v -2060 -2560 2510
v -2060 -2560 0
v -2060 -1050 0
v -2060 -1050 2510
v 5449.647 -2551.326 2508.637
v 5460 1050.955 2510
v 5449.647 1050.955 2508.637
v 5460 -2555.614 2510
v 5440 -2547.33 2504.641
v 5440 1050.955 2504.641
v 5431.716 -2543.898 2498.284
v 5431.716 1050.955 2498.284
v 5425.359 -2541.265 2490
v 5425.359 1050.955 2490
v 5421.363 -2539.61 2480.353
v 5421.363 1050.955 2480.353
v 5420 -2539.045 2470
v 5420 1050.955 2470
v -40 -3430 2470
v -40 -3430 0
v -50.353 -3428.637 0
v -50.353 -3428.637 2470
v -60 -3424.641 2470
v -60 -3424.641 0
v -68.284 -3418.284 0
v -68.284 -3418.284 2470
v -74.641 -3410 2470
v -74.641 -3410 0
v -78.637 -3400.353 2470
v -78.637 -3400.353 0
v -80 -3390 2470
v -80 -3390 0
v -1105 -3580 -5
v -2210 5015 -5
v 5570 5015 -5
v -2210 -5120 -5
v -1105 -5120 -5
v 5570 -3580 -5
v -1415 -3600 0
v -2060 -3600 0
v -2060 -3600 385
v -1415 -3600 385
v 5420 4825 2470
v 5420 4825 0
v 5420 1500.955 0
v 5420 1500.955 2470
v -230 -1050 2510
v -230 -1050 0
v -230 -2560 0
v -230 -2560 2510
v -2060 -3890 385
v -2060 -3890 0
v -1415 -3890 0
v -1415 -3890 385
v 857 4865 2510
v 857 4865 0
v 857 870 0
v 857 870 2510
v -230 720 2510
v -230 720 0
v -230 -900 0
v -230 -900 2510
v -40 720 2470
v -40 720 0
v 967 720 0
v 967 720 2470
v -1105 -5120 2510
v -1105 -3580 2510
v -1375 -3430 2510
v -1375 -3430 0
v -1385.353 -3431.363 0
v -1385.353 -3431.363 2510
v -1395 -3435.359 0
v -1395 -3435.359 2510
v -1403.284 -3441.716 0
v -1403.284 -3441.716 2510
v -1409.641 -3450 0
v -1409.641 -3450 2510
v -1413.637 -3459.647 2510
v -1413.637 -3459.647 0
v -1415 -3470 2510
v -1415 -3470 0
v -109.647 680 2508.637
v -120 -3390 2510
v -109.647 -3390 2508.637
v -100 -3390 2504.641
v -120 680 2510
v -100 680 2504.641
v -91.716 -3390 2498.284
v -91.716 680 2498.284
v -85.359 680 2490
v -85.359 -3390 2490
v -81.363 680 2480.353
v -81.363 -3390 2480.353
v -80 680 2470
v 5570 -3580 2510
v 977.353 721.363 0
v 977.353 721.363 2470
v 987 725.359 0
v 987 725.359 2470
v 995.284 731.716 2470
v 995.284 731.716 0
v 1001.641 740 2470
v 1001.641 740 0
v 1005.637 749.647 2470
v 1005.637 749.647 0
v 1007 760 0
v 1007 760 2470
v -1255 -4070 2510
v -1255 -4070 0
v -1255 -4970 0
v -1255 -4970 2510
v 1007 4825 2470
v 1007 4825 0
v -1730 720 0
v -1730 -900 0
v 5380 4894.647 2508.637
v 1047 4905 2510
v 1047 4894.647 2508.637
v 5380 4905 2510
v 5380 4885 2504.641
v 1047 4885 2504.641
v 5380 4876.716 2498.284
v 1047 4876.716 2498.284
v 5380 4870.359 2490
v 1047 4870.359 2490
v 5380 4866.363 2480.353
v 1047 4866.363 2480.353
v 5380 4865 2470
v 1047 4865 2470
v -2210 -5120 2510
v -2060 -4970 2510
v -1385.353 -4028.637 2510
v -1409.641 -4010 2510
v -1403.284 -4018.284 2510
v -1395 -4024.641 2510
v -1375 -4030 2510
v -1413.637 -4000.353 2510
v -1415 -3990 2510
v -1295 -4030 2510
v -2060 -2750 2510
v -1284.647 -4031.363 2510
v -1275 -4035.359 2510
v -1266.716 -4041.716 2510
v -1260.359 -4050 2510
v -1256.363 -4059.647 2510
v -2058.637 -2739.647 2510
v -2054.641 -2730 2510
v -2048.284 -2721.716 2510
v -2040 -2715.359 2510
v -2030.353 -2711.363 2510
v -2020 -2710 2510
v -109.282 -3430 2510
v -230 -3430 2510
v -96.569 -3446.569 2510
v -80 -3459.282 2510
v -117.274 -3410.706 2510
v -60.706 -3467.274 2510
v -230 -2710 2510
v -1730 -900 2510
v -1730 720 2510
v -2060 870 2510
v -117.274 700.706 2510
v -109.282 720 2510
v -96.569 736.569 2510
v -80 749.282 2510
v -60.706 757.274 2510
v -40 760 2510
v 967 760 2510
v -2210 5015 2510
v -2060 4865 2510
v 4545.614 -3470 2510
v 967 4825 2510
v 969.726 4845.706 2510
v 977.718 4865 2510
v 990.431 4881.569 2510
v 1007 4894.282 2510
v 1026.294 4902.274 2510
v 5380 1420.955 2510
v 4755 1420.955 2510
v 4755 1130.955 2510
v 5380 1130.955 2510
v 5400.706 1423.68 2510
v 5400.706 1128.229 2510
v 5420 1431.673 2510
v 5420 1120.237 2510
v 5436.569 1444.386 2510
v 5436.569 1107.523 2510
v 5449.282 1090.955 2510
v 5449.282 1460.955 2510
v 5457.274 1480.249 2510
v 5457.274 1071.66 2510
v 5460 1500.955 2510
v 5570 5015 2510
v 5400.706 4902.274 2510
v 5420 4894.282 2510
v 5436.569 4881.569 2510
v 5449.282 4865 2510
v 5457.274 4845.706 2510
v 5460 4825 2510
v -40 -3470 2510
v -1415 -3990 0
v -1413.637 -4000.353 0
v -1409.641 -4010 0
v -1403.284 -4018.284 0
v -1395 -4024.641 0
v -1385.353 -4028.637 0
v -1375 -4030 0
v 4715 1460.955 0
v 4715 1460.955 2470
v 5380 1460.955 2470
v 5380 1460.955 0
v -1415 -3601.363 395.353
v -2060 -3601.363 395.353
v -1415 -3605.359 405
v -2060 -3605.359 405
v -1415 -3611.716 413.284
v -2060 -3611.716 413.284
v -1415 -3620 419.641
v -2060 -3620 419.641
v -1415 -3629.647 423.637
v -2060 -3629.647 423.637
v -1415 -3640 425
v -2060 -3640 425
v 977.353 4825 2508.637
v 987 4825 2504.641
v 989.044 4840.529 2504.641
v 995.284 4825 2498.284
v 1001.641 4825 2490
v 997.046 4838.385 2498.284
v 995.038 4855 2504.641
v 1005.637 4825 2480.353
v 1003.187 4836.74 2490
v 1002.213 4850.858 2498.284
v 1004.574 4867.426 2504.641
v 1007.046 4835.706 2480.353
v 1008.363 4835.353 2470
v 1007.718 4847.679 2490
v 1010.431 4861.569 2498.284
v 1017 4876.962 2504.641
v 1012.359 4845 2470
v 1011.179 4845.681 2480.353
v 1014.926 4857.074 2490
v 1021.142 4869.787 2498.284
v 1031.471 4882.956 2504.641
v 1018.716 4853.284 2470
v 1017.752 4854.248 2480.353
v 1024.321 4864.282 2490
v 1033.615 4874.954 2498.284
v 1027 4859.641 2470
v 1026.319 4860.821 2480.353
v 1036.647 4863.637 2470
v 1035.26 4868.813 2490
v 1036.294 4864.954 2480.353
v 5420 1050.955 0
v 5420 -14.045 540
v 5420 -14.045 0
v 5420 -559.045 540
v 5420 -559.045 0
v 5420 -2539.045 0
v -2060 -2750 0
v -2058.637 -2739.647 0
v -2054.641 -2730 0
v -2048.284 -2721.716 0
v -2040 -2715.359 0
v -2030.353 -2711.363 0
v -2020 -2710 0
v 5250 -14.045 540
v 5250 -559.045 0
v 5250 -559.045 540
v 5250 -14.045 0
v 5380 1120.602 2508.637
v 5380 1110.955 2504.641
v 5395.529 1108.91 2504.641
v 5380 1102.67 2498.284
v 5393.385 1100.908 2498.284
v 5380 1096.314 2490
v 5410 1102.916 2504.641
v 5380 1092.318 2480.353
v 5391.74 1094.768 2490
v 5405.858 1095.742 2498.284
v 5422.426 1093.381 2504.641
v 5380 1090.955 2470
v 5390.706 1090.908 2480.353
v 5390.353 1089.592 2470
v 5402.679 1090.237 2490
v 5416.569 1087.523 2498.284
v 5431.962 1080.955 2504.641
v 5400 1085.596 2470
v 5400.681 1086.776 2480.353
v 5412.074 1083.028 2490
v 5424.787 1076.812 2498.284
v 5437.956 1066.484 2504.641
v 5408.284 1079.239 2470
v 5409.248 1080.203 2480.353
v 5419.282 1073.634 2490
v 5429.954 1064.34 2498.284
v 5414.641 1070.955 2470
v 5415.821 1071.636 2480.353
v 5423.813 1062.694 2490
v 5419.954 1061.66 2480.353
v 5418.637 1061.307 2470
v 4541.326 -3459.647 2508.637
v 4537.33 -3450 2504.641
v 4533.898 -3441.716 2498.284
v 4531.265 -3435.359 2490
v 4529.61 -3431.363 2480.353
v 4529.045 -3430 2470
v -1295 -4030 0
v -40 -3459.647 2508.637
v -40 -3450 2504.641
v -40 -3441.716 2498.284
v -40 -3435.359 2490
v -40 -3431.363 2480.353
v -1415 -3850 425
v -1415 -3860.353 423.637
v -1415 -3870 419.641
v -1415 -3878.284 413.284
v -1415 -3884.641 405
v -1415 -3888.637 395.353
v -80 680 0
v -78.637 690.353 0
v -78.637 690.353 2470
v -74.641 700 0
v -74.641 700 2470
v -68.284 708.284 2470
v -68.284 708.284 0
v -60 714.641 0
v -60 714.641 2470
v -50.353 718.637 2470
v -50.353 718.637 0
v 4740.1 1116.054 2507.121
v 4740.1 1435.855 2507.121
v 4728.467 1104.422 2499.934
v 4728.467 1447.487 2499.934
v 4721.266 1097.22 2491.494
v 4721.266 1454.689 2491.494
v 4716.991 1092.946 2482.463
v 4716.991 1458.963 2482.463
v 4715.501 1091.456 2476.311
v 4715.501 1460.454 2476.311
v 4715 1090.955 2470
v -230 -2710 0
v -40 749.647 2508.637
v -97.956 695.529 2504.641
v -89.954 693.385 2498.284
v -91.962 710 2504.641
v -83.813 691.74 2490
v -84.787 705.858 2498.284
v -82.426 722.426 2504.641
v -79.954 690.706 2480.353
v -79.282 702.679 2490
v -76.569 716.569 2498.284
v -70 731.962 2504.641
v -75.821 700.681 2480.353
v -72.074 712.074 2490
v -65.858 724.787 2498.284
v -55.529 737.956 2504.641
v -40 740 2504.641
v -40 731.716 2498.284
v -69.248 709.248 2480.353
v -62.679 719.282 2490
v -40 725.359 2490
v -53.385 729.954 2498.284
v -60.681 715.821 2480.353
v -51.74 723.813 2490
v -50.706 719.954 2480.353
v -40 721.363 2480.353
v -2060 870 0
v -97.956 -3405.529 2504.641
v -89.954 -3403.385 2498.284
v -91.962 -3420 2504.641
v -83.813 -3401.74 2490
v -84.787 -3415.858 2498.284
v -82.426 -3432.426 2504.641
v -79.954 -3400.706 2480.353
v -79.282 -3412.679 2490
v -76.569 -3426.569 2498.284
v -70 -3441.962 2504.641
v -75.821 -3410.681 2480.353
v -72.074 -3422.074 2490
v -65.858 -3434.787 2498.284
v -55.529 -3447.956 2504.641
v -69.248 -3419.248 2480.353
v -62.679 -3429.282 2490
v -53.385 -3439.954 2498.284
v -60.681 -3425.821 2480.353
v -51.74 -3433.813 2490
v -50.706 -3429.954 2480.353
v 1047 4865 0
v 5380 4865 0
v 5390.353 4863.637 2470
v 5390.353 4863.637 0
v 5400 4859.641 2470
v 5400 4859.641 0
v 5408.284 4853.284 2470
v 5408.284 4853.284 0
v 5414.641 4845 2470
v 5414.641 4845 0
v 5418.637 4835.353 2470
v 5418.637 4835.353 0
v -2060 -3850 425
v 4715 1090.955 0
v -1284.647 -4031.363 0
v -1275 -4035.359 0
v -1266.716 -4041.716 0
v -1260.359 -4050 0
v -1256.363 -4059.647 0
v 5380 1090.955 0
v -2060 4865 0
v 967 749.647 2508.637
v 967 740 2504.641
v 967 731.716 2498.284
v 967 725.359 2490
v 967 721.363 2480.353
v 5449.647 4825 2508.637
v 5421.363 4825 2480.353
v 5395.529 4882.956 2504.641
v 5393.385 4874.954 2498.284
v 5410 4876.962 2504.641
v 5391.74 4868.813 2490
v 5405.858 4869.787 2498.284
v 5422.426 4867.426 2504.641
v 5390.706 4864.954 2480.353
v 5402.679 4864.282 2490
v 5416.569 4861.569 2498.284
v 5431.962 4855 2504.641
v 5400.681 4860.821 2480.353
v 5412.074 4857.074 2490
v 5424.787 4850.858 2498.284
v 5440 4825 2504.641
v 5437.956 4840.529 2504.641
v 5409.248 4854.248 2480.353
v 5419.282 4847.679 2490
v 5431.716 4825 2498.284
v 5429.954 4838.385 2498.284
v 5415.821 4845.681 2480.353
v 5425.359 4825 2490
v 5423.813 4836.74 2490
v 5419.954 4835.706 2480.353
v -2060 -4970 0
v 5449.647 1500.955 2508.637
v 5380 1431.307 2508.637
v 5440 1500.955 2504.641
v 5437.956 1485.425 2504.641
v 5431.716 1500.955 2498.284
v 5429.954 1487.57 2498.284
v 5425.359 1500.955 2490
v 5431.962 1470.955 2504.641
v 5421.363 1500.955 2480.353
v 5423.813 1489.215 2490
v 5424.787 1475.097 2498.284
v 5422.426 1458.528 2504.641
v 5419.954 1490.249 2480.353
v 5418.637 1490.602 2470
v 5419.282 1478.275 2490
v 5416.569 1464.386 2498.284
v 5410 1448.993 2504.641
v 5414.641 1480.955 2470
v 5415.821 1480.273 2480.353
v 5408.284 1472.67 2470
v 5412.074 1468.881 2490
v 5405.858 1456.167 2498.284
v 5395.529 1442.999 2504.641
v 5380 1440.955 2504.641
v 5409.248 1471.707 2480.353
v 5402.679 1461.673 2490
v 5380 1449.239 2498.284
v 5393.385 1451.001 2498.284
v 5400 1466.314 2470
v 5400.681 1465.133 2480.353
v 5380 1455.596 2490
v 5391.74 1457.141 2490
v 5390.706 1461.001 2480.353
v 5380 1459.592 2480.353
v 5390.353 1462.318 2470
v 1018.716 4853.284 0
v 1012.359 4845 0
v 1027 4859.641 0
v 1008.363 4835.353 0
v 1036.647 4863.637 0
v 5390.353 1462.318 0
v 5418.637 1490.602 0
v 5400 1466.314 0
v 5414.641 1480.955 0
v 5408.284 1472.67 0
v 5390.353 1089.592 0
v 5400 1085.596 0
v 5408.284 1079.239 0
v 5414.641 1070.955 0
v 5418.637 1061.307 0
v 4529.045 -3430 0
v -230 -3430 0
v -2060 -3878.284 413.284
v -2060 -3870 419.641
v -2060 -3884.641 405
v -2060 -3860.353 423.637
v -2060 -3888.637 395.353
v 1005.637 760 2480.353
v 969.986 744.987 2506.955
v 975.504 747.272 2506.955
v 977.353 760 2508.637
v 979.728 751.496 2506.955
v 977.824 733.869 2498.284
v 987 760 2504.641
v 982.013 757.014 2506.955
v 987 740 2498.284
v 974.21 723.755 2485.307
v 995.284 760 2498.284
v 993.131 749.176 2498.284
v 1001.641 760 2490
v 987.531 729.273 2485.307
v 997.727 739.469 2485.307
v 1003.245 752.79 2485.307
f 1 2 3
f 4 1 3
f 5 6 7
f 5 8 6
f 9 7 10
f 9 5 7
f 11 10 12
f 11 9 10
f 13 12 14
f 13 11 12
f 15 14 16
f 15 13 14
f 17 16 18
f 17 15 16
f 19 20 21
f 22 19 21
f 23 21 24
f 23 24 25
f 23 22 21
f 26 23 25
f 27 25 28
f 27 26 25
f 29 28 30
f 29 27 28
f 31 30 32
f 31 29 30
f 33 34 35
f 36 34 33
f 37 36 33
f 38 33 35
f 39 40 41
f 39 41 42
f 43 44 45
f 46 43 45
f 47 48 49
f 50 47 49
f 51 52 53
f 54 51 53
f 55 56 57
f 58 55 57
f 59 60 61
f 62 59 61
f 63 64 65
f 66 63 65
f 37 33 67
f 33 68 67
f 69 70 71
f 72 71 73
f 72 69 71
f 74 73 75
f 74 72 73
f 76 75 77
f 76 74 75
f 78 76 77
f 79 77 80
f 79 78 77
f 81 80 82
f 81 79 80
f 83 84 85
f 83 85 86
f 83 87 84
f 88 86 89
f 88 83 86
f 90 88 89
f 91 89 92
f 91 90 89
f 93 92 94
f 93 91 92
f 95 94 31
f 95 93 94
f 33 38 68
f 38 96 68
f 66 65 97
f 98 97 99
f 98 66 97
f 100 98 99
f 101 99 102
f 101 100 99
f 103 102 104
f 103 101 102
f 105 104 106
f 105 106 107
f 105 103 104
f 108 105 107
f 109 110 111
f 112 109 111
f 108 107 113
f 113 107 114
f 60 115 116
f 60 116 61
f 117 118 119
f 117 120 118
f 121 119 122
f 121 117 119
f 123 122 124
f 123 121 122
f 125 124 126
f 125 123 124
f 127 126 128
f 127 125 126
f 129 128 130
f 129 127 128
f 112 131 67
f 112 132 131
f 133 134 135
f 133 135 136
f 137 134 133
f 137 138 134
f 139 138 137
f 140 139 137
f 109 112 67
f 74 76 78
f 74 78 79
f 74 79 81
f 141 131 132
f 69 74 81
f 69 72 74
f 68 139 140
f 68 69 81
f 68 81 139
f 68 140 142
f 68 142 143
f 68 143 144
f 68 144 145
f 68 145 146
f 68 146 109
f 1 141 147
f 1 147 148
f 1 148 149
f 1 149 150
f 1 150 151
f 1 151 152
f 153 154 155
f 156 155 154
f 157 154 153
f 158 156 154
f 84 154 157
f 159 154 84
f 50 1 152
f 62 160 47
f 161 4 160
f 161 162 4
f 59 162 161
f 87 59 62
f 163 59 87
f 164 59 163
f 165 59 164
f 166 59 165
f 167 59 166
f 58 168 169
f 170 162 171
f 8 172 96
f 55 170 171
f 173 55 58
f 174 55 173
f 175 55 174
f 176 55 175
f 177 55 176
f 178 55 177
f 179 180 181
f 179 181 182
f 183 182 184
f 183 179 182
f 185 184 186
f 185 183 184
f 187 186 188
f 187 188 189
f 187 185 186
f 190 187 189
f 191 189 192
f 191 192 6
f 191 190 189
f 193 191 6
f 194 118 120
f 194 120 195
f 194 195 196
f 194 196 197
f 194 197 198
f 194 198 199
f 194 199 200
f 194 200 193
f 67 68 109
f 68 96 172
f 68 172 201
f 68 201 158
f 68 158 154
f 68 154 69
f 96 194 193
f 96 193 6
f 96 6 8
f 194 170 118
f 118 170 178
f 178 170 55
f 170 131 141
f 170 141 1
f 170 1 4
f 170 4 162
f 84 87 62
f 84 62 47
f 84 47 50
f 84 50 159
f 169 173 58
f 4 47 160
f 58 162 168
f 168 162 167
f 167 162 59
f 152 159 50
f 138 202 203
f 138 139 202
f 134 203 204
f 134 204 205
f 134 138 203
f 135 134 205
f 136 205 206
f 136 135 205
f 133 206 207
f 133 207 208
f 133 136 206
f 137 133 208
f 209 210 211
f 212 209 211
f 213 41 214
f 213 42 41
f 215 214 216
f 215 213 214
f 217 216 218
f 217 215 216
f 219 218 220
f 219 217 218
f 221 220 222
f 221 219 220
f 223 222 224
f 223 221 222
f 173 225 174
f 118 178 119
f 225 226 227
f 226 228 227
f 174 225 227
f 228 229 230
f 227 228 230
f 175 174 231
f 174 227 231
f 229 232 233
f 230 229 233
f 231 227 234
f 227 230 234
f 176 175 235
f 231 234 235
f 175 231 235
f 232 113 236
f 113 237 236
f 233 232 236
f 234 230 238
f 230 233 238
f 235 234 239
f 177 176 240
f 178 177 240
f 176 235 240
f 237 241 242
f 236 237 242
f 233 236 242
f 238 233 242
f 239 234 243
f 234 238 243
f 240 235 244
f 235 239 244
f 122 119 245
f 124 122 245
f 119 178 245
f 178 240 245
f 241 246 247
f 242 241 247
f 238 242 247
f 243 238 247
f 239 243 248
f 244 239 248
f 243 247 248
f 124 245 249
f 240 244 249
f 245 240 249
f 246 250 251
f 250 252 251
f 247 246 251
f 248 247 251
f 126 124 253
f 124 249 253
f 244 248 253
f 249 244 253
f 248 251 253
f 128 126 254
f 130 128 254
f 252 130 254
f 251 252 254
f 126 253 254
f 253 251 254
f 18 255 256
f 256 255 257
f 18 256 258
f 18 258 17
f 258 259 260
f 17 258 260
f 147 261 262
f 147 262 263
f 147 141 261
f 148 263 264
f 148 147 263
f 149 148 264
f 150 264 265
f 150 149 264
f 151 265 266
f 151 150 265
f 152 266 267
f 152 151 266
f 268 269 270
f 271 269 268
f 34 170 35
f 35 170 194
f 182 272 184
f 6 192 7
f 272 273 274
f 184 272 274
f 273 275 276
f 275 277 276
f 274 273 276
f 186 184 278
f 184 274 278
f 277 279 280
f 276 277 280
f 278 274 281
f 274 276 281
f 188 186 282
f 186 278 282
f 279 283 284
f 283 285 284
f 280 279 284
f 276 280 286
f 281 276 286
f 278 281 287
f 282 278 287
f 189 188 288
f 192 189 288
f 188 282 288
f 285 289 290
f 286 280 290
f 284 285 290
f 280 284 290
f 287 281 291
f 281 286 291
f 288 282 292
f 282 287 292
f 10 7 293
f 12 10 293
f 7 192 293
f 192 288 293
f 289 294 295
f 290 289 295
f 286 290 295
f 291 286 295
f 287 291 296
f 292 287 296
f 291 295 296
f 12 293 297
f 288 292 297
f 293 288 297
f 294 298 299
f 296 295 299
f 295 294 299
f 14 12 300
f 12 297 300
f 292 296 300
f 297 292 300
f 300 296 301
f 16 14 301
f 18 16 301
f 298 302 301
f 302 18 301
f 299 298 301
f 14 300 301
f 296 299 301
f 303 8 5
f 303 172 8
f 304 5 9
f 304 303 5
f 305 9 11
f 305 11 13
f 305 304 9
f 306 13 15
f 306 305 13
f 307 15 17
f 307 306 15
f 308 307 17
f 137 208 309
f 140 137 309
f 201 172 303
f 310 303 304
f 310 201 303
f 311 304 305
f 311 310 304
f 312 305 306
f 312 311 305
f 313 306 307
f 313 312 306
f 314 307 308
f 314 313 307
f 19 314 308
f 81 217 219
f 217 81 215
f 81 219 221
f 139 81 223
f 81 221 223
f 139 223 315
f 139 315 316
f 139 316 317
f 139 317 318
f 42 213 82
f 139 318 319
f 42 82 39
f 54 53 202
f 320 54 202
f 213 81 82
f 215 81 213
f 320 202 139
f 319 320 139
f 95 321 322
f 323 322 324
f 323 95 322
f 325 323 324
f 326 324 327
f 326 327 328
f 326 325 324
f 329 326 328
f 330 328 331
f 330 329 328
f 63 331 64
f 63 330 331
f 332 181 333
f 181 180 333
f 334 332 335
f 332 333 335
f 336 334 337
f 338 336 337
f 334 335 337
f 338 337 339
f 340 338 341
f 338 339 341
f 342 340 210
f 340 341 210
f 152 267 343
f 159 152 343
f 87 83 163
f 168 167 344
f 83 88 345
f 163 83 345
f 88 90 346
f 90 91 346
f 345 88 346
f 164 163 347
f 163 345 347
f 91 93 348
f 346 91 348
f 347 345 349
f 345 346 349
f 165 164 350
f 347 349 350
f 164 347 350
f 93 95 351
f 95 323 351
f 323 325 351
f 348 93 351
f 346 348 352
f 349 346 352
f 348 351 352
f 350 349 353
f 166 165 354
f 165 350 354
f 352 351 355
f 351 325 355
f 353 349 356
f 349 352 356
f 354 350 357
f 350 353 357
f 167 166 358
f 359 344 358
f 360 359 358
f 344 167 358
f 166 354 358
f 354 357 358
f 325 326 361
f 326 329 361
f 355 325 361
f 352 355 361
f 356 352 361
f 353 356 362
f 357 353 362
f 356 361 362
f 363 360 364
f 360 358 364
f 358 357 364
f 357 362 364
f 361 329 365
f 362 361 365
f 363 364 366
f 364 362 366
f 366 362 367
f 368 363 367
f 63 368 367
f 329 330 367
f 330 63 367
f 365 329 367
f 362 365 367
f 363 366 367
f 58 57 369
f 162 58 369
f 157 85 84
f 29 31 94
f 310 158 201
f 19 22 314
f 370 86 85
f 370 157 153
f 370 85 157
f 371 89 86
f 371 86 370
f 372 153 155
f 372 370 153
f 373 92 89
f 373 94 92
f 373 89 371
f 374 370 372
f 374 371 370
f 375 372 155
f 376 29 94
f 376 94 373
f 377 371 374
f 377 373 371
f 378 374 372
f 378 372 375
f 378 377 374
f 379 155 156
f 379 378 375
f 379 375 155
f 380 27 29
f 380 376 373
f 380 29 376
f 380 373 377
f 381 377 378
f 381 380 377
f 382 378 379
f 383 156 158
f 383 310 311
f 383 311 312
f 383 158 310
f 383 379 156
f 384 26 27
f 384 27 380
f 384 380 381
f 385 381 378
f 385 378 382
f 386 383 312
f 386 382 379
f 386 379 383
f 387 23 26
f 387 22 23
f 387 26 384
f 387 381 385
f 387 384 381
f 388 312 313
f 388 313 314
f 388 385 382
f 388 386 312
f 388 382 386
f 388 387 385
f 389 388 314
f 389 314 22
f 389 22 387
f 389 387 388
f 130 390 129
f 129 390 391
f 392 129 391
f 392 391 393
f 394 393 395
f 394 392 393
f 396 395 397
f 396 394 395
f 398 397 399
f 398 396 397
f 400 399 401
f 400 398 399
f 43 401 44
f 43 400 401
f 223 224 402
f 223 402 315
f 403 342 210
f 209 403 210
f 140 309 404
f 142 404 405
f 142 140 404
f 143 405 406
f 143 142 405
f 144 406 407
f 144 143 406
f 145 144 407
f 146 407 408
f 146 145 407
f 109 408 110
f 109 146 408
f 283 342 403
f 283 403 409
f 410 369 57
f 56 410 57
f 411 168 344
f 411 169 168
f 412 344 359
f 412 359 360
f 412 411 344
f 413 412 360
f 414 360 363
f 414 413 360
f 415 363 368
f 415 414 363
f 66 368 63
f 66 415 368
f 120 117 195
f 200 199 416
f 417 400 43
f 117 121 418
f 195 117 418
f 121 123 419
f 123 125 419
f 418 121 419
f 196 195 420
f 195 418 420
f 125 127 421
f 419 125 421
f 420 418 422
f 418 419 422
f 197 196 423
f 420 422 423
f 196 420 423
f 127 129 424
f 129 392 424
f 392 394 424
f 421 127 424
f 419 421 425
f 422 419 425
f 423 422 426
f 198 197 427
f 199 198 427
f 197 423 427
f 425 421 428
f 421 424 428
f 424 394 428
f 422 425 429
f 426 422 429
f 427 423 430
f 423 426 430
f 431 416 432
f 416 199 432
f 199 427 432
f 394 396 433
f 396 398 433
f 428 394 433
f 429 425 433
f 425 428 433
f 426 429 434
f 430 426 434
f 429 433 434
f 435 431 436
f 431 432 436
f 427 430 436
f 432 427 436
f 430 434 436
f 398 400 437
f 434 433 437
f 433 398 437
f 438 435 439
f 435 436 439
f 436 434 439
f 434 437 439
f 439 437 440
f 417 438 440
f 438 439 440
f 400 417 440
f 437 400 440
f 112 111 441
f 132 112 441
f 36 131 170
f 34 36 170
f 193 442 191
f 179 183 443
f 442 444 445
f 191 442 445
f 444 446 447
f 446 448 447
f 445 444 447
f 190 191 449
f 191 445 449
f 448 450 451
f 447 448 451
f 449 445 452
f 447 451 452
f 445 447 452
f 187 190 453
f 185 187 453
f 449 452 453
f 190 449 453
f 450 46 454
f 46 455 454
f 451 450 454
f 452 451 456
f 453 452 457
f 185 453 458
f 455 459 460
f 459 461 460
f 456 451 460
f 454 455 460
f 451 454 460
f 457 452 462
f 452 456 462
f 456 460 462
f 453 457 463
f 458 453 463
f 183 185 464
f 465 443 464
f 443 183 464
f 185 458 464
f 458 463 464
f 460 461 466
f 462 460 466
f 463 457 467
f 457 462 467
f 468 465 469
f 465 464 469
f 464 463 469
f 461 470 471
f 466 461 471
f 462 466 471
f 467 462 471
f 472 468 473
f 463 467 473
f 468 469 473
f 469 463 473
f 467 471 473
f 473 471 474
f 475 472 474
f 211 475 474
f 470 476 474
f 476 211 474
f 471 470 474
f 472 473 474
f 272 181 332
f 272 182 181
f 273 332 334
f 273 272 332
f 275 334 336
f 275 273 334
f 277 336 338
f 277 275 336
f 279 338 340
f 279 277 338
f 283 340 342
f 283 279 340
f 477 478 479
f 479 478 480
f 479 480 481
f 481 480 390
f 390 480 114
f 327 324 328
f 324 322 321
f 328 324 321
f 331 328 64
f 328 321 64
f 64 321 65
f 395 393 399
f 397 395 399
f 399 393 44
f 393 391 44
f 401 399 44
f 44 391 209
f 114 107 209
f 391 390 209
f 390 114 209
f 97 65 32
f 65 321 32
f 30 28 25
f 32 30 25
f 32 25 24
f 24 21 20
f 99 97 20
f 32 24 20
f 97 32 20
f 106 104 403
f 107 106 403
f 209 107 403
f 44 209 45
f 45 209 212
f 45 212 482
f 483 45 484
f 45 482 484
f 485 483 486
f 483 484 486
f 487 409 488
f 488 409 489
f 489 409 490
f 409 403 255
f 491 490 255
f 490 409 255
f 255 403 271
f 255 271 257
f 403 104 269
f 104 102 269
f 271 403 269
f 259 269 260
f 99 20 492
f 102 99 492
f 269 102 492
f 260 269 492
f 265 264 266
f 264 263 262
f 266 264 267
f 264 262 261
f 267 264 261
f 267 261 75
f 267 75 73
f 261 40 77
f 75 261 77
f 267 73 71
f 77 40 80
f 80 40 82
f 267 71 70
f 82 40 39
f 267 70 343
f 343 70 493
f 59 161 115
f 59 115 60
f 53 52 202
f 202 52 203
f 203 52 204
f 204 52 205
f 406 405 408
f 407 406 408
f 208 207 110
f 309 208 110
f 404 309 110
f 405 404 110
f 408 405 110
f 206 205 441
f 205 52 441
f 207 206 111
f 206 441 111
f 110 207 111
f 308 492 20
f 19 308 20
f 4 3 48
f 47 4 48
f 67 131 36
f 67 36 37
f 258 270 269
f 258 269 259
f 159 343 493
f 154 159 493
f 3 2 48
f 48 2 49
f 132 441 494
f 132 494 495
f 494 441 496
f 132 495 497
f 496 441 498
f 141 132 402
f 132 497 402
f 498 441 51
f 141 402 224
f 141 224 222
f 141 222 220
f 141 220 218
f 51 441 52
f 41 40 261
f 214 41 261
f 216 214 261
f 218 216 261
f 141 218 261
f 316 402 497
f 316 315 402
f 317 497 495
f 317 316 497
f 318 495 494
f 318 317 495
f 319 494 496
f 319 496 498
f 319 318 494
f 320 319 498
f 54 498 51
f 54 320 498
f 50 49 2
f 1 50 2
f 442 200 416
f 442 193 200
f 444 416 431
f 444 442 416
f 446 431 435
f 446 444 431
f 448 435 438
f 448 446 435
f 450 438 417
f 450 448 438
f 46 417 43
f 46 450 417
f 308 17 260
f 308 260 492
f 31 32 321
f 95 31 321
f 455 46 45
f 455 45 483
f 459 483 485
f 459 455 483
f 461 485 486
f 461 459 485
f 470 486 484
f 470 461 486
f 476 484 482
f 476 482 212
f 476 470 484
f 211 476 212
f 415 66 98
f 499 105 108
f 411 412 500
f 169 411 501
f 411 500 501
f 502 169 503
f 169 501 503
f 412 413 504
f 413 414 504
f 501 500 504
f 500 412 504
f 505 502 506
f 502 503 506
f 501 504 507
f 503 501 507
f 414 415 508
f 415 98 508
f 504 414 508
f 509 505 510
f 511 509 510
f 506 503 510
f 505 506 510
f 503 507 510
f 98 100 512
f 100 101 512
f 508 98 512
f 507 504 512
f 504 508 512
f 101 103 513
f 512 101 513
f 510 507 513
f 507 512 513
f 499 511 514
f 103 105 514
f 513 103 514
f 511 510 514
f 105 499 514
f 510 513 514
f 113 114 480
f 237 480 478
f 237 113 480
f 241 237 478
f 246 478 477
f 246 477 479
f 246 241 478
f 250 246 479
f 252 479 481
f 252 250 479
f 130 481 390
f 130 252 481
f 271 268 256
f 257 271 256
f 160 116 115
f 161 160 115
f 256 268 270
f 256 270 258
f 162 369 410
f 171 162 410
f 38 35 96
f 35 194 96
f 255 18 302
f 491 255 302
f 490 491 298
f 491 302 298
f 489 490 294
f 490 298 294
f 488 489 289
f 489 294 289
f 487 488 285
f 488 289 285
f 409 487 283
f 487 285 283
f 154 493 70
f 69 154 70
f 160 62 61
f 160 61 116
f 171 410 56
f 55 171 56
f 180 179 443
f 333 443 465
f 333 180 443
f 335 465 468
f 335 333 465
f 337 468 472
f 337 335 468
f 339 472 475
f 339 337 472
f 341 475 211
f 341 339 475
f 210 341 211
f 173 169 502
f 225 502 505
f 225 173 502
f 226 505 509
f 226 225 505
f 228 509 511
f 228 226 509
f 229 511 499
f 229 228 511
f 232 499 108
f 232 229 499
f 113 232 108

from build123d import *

# Parameters (mm, degrees)
F0_W     = 330
F0_H     = 1320
F1_DEPTH = 2510
F2_DEPTH = 2510
F0_W_2   = 705
F0_H_2   = 370
F3_DEPTH = 2510
F0_W_3   = 645
F0_H_3   = 290
F4_DEPTH = 425
F5_R     = 40
F6_W     = 1105
F6_H     = 1540
F7_DEPTH = 5
F8_R     = 40
F0_W_4   = 170
F0_H_4   = 545
F9_DEPTH = 540


with BuildPart() as f1:
    # F0 (on Top) → F1 (new body)
    with BuildSketch(Plane.XY):
        Polygon((-2210, -2560), (-2210, -5120), (-1105, -5120), (-1105, -4030), (-1255, -4030), (-1255, -4970), (-2060, -4970), (-2060, -3890), (-2060, -3600), (-2060, -2710), (-230, -2710), (-230, -2560), (-2060, -2560), (-2060, -1050), (-230, -1050), (-230, -900), (-1730, -900), (-2210, -900), align=None)
        Polygon((-1255, -4030), (-1105, -4030), (-1105, -3580), (-230, -3580), (-230, -3430), (-1415, -3430), (-1415, -3580), (-1415, -3600), (-1415, -3890), (-1415, -4030), align=None)
        Polygon((-2210, -750), (-2210, -900), (-1730, -900), (-1730, 720), (-230, 720), (-230, -900), (-230, -1050), (-230, -2560), (-230, -2710), (-230, -3430), (-230, -3580), (5570, -3580), (5570, 5015), (857, 5015), (-2210, 5015), (-2210, 870), (-2210, 570), (-1880, 570), (-1880, -750), align=None)
        Polygon((-1880, 870), (-2060, 870), (-2060, 4865), (857, 4865), (857, 870), (-230, 870), align=None, mode=Mode.SUBTRACT)
        Polygon((-80, 720), (1007, 720), (1007, 4865), (5420, 4865), (5420, 1460.954544), (5420, 1090.954544), (5420, -14.045456), (5420, -559.045456), (5420, -2539.045456), (5420, -3430), (4529.045456, -3430), (-80, -3430), align=None, mode=Mode.SUBTRACT)
        with Locations((-2045, -90)):
            Rectangle(F0_W, F0_H)
    extrude(amount=F1_DEPTH)

    # F0 (on Top) → F2 (join)
    with BuildSketch(Plane.XY):
        Polygon((5420, -2539.045456), (4529.045456, -3430), (5420, -3430), align=None)
    extrude(amount=F2_DEPTH)

    # F0 (on Top) → F3 (join)
    with BuildSketch(Plane.XY):
        with Locations((5067.5, 1275.954544)):
            Rectangle(F0_W_2, F0_H_2)
    extrude(amount=F3_DEPTH)

    # F0 (on Top) → F4 (join)
    with BuildSketch(Plane.XY):
        with Locations((-1737.5, -3745)):
            Rectangle(F0_W_3, F0_H_3)
    extrude(amount=F4_DEPTH)

    # F5
    f5_edges = [f1.edges().sort_by_distance(p)[0] for p in [
        (-1255, -4030, 1255),
        (-1415, -4030, 1255),
        (-1415, -3430, 1255),
        (-1737.5, -3890, 425),
        (-1737.5, -3600, 425),
        (5420, 1090.954544, 1255),
        (5420, 1460.954544, 1255),
        (5420, 4865, 1255),
        (1007, 4865, 1255),
        (1007, 720, 1255),
        (-80, 720, 1255),
        (-2060, -2710, 1255),
    ]]
    fillet(f5_edges, radius=F5_R)

    # F6 (on face) → F7 (join)
    with BuildSketch(Plane(origin=(0, 0, 0), x_dir=(1, 0, 0), z_dir=(0, 0, -1))):
        Polygon((-2210, 3580), (-2210, -5015), (5570, -5015), (5570, 3580), (-1105, 3580), align=None)
        with Locations((-1657.5, 4350)):
            Rectangle(F6_W, F6_H)
    extrude(amount=F7_DEPTH)

    # F8
    f8_edges = [f1.edges().sort_by_distance(p)[0] for p in [
        (-80, -1375, 2510),
        (463.5, 720, 2510),
        (1007, 2792.5, 2510),
        (3213.5, 4865, 2510),
        (5420, -744.045456, 2510),
        (4974.522728, -2984.522728, 2510),
        (2224.522728, -3430, 2510),
        (4715, 1275.954544, 2510),
        (-80, -3430, 1255),
    ]]
    fillet(f8_edges, radius=F8_R)

    # F0 (on Top) → F9 (join)
    with BuildSketch(Plane.XY):
        with Locations((5335, -286.545456)):
            Rectangle(F0_W_4, F0_H_4)
    extrude(amount=F9_DEPTH)


solid = f1.part
